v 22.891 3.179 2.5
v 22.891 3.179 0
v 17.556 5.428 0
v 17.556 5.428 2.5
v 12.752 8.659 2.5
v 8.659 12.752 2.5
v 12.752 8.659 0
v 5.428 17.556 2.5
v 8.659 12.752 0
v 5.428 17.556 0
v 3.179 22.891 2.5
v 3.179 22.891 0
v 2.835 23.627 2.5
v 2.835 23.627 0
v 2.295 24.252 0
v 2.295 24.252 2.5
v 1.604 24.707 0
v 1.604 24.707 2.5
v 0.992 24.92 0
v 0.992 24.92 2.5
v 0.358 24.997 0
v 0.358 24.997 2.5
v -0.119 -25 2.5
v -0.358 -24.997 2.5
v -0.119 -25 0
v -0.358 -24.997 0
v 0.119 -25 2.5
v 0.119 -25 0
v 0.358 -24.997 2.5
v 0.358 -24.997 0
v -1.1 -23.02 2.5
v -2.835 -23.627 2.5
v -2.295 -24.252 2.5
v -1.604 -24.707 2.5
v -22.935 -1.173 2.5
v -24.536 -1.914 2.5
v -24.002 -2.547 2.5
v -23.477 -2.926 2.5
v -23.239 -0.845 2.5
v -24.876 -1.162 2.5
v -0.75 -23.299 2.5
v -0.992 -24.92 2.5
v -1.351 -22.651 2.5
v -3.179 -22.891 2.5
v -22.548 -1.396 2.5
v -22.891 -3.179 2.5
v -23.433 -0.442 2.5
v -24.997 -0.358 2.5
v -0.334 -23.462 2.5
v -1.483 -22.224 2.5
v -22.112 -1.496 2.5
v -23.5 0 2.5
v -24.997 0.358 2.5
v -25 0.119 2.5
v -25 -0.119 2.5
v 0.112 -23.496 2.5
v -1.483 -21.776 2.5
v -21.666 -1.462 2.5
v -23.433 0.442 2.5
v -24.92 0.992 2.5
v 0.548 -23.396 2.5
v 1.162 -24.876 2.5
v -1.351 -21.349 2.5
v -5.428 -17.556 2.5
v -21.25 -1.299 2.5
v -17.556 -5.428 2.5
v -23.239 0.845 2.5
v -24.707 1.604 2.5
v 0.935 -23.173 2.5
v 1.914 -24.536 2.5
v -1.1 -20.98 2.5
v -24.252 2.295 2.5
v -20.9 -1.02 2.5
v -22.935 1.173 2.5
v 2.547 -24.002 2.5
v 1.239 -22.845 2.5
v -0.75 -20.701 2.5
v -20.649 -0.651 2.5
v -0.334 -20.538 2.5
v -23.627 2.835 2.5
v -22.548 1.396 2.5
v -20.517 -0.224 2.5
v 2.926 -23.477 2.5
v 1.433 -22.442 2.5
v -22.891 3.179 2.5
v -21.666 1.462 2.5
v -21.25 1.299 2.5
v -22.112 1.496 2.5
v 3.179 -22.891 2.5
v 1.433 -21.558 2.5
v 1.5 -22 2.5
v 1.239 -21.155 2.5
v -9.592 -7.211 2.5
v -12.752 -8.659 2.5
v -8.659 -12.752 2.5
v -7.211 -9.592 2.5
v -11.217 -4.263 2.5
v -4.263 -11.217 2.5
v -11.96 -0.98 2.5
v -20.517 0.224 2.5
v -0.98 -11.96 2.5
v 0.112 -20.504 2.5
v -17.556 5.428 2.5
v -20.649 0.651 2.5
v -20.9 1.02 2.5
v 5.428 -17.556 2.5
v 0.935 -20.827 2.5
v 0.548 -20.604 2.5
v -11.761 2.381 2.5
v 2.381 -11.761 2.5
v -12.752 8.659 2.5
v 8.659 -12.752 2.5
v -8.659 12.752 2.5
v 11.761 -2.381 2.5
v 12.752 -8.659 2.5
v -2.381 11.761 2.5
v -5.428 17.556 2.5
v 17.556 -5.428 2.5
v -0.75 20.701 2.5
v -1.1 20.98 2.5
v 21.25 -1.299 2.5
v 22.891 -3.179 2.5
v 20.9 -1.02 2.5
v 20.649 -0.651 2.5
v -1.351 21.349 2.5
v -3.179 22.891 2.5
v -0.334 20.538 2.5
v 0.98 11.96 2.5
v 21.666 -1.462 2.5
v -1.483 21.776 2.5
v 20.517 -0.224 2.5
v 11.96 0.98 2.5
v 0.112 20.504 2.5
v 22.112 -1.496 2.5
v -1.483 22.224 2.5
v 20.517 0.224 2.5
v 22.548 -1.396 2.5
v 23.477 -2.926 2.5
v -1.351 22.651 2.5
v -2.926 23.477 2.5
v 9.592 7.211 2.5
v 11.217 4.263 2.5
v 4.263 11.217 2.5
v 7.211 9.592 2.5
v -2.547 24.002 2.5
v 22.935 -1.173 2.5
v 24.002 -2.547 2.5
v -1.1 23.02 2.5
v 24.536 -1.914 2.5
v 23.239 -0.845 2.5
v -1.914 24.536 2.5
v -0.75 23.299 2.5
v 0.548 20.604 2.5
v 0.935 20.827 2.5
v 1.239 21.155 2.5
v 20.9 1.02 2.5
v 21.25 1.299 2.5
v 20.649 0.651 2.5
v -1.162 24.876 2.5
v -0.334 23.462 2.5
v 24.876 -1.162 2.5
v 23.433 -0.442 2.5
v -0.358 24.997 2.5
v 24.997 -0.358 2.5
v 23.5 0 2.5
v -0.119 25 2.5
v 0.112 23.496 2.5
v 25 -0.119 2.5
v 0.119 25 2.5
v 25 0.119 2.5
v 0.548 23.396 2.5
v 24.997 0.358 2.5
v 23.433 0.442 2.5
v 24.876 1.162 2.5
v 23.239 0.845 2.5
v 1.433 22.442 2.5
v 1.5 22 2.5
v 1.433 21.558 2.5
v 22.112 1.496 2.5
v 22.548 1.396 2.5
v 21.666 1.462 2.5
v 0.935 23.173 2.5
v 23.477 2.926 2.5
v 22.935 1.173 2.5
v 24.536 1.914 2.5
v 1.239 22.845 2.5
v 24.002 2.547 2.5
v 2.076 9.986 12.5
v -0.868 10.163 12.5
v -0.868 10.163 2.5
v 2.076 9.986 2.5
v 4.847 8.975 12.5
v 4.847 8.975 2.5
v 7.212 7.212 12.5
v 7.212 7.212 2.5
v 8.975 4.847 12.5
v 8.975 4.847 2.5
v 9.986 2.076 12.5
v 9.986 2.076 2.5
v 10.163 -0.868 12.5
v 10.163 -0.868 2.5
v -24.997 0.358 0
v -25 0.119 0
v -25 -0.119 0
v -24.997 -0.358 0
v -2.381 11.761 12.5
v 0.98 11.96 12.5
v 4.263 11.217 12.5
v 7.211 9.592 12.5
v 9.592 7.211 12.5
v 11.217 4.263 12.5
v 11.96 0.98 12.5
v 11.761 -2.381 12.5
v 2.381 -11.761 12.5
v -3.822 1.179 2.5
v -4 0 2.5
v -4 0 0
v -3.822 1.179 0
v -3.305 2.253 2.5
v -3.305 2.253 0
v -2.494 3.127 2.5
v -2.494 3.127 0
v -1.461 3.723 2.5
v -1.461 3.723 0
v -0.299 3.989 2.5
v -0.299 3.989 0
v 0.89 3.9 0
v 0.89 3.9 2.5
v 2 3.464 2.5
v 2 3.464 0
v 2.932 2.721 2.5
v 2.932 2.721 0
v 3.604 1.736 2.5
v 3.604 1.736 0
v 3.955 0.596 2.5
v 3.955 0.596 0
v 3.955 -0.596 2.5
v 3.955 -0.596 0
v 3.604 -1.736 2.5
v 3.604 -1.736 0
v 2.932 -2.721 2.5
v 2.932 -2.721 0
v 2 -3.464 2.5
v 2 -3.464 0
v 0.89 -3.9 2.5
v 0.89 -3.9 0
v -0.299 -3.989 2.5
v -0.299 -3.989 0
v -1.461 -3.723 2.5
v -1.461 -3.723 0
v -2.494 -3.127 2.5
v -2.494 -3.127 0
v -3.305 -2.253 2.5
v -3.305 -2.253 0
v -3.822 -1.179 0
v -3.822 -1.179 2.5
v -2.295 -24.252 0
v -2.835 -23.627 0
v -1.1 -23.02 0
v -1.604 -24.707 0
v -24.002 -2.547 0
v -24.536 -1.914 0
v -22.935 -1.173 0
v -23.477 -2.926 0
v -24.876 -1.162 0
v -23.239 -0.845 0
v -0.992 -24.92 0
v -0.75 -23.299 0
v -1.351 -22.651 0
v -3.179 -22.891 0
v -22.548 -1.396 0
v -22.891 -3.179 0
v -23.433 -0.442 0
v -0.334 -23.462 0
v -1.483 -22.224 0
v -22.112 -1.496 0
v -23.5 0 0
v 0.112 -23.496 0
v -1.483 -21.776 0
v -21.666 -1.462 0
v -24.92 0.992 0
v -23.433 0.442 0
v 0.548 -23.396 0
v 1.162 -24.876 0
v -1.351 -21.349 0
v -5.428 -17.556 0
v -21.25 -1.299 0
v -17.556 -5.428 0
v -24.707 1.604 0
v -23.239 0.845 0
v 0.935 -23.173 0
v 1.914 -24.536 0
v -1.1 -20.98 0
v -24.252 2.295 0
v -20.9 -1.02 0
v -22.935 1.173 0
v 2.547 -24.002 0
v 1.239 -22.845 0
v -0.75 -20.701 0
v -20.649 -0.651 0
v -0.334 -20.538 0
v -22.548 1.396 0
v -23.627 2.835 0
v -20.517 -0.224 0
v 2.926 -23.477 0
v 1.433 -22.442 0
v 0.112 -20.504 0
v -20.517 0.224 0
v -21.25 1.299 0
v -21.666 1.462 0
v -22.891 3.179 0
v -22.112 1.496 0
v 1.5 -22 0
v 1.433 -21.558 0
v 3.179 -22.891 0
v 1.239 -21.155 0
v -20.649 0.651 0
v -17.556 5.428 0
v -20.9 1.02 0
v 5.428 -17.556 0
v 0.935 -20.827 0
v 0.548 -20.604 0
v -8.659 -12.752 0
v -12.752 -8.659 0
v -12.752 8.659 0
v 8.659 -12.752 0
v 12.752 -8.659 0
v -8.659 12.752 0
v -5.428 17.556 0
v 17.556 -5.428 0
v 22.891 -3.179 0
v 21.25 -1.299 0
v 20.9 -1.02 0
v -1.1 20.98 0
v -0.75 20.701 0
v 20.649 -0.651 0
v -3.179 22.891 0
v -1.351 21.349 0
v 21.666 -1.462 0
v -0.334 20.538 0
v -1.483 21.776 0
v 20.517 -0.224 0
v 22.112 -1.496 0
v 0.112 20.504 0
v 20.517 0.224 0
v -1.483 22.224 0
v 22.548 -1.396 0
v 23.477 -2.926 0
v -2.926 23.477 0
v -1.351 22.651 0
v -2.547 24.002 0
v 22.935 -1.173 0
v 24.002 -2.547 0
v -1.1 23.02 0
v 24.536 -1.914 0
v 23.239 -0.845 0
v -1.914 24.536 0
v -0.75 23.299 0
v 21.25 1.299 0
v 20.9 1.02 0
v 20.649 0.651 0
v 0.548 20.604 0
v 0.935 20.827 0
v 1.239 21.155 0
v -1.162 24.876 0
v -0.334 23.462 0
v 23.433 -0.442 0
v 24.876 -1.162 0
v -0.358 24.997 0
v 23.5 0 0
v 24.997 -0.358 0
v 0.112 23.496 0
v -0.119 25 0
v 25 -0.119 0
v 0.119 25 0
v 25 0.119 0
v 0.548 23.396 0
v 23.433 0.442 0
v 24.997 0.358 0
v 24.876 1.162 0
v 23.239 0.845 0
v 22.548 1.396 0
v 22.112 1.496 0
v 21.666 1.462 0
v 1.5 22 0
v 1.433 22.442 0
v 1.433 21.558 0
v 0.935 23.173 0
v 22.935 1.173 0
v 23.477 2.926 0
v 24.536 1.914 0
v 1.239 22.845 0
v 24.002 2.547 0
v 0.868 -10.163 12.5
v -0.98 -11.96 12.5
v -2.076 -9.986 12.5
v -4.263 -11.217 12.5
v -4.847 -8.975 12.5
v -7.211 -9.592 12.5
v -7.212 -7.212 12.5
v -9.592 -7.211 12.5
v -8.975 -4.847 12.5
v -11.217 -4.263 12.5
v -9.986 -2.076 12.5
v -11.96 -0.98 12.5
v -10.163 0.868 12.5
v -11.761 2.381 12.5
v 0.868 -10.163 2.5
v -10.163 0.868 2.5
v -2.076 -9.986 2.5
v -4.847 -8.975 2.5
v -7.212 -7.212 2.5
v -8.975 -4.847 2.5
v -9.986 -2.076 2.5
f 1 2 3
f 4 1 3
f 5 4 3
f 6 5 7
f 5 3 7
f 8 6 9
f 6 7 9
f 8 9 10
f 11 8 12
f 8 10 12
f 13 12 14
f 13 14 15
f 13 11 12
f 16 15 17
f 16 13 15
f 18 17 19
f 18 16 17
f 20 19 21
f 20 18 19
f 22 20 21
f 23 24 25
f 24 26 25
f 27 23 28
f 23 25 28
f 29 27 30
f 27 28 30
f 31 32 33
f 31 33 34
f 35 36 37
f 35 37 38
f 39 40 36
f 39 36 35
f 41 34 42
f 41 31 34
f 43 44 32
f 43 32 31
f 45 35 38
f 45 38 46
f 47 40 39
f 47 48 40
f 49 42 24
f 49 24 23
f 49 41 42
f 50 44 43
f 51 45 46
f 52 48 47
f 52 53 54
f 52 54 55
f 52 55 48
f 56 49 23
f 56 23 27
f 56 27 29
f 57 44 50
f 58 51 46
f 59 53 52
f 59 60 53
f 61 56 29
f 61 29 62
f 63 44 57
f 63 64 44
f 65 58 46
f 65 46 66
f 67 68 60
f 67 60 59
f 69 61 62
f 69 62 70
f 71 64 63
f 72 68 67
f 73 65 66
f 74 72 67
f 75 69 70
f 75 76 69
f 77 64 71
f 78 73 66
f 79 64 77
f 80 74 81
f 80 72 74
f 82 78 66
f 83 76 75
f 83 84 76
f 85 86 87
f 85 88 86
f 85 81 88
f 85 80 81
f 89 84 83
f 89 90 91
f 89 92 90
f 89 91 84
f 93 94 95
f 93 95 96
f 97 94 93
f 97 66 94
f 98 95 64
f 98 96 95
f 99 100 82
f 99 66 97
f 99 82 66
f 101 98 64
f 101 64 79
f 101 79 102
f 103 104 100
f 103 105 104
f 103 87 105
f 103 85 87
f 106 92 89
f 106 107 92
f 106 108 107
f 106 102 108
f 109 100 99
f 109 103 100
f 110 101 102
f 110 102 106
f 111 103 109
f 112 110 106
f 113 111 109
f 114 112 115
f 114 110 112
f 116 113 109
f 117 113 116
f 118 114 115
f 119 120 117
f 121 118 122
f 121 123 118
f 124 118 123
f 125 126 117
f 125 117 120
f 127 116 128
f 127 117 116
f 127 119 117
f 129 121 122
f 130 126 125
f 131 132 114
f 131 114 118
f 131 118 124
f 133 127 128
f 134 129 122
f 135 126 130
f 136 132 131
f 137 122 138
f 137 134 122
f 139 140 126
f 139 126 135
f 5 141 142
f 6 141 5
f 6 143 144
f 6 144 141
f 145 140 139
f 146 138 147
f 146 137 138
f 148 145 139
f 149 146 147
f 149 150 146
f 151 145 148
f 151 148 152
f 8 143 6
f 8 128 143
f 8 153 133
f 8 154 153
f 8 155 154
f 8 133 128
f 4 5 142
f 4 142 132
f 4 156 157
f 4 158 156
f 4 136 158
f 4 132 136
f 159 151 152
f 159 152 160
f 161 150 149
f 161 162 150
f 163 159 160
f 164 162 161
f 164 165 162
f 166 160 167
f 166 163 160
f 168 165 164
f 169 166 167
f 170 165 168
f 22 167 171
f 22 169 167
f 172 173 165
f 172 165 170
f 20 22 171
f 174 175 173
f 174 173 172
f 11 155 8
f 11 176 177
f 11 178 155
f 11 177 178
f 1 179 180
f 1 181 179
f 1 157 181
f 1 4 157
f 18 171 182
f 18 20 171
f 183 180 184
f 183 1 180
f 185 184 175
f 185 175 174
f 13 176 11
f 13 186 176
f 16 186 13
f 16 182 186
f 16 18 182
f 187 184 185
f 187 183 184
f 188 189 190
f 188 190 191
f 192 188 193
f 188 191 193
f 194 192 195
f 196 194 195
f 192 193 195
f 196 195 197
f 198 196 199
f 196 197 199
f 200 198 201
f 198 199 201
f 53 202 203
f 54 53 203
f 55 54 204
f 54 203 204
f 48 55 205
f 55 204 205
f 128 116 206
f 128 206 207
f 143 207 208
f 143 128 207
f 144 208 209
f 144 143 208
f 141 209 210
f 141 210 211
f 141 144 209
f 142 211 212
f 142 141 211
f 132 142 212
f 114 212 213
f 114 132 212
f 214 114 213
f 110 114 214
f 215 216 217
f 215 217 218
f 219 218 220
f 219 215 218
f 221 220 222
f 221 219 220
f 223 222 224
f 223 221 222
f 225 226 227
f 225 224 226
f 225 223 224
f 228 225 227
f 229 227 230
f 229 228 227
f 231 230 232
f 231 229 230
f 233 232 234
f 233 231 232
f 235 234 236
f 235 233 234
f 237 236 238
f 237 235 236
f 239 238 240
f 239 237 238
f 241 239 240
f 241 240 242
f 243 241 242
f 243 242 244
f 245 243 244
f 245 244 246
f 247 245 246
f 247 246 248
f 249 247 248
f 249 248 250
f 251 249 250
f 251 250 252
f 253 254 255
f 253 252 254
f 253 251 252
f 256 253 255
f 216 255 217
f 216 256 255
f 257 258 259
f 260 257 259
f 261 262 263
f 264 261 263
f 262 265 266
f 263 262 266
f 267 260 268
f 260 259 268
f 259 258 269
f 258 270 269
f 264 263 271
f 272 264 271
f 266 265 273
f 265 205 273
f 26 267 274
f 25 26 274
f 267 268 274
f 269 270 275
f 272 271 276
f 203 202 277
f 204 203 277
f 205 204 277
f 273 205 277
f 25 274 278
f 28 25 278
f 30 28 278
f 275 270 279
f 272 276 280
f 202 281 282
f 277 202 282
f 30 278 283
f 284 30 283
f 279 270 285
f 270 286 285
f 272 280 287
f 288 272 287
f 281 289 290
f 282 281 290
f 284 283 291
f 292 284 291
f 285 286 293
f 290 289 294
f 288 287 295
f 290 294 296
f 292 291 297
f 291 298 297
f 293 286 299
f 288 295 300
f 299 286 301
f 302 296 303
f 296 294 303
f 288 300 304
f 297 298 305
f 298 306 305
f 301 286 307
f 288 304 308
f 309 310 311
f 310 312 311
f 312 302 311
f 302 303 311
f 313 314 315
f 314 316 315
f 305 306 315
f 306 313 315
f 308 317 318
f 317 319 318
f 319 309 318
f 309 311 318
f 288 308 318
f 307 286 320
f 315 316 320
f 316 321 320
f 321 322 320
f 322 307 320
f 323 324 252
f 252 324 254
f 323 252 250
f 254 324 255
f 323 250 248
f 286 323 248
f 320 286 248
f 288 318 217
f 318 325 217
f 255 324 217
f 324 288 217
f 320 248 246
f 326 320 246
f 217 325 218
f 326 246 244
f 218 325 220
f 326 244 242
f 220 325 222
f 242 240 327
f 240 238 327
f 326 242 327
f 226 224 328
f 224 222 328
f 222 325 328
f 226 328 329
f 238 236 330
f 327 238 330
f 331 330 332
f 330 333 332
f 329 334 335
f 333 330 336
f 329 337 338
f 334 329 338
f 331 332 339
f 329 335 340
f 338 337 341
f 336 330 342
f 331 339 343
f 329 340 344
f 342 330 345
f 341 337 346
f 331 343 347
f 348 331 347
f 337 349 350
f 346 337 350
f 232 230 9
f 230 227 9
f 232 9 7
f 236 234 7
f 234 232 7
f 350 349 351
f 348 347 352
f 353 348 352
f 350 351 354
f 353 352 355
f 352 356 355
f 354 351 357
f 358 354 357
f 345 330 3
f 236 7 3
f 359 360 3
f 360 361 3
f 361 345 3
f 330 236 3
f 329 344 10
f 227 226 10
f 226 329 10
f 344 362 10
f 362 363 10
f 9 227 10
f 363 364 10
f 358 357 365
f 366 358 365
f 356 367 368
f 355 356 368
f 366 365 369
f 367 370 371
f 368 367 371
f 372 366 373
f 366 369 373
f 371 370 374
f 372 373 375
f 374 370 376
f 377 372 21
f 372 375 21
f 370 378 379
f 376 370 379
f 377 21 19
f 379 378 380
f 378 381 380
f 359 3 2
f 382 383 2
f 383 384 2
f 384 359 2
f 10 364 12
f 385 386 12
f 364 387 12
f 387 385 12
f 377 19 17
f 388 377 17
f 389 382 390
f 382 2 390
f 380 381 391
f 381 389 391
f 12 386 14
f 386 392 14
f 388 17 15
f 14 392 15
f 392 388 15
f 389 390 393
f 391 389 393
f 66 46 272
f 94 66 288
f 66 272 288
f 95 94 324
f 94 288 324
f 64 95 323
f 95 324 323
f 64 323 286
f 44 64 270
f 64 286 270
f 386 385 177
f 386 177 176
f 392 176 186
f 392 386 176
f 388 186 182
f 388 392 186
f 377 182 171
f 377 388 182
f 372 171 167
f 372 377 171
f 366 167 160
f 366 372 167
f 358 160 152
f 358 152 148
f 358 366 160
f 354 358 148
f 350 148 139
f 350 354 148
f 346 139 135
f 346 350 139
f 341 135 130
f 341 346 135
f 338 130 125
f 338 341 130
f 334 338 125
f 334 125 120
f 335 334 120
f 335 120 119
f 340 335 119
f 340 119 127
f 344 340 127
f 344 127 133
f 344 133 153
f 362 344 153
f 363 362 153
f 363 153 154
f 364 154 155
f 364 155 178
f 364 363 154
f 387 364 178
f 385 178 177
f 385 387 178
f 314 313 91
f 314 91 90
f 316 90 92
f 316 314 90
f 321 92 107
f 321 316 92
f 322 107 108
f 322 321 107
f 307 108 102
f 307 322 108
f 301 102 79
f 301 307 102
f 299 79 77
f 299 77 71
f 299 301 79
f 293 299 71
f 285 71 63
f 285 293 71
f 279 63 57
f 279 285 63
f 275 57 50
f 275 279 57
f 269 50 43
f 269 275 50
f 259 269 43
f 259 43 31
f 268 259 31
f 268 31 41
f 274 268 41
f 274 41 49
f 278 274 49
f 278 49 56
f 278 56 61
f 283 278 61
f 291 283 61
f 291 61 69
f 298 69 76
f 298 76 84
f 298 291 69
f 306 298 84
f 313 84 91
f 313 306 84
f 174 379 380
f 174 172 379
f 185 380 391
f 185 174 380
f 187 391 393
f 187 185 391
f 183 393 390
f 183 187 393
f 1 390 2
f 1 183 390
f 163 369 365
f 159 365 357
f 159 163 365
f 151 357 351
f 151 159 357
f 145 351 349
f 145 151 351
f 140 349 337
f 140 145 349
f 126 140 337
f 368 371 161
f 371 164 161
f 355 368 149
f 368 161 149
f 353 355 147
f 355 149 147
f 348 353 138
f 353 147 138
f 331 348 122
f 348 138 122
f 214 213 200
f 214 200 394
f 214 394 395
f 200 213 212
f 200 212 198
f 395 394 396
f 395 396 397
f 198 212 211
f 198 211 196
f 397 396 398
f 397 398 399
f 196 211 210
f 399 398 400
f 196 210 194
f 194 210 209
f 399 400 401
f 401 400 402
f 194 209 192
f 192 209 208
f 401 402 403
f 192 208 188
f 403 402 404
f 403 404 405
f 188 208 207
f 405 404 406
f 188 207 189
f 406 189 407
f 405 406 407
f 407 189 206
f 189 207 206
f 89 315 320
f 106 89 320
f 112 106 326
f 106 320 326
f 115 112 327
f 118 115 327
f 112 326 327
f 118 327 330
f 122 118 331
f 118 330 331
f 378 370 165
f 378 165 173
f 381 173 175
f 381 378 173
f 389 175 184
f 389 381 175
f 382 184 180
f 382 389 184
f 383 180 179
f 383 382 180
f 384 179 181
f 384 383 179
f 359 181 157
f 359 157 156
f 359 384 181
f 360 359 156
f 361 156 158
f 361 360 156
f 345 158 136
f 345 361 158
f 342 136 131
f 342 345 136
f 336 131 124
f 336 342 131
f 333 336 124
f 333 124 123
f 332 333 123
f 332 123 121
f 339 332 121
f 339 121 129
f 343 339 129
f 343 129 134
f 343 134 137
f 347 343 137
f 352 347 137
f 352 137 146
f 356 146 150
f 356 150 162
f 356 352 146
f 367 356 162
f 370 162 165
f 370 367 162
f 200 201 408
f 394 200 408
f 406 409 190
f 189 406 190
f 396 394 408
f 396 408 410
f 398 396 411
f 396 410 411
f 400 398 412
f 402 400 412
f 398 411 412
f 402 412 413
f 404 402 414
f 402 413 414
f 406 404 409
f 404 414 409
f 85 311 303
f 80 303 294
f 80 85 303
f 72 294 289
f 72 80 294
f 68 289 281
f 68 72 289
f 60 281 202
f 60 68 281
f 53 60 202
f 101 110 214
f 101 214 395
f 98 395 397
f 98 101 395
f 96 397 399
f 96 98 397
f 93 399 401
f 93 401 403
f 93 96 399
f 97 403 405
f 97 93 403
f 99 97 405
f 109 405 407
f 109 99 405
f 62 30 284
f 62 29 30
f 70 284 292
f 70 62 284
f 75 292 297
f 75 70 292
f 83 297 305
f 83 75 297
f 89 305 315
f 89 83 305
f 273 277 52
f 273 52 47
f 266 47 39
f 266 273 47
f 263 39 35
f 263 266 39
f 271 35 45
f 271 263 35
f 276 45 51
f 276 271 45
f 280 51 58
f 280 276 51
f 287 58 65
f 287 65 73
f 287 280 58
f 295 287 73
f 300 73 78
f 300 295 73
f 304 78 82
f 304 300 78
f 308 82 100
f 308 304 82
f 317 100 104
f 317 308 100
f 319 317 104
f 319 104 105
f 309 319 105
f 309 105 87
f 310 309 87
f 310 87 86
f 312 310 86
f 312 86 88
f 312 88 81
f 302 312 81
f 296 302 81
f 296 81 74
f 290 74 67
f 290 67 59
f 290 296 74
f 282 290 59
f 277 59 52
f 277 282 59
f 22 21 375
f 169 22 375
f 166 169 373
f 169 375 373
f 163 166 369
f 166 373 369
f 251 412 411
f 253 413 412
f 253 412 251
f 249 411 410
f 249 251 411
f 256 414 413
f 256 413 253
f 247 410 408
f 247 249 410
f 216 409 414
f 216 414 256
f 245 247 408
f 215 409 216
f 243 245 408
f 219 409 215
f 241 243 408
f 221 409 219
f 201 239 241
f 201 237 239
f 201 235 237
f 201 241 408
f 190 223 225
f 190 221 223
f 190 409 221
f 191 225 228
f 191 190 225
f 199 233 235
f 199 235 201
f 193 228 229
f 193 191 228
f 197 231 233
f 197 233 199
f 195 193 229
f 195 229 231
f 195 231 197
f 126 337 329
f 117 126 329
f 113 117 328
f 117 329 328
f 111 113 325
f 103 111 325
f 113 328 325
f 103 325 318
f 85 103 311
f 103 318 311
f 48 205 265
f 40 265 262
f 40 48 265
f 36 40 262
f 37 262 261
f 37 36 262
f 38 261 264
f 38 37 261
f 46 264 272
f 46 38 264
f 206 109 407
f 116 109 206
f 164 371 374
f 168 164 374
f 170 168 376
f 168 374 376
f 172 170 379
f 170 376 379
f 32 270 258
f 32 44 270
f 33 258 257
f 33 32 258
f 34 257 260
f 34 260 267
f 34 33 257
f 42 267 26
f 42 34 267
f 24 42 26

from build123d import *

# Parameters (mm, degrees)
SKETCH_1_R               = 25
SKETCH_1_R_2             = 1.5
EXTRUDE_1_DEPTH          = 2.5
CUT_EXTRUDE_2_DEPTH      = 36.443617197
CUT_EXTRUDE_2_DEPTH_BACK = 36.443617197
SKETCH_3_R               = 4
CUT_EXTRUDE_5_DEPTH      = 10
FILLET_2_R               = 3
EXTRUDE_2_DEPTH          = 10


with BuildPart() as part:
    # 草图1 → 凸台-拉伸1 (new body)
    with BuildSketch(Plane.XY):
        Circle(SKETCH_1_R)
        with Locations((0, 22)):
            Circle(SKETCH_1_R_2, mode=Mode.SUBTRACT)
        with Locations((22, 0)):
            Circle(SKETCH_1_R_2, mode=Mode.SUBTRACT)
        with Locations((0, -22)):
            Circle(SKETCH_1_R_2, mode=Mode.SUBTRACT)
        with Locations(Location((-22, 0, 0), (0, 0, 180))):
            Circle(SKETCH_1_R_2, mode=Mode.SUBTRACT)
    extrude(amount=EXTRUDE_1_DEPTH)

    # 草图3 → 切除-拉伸2 (cut, two sides: drawn at the far end of the back side and taken through both)
    with BuildSketch(Plane(origin=(0, 0, 0), x_dir=(-1, 0, 0), z_dir=(0, 0, -1)).offset(-CUT_EXTRUDE_2_DEPTH_BACK)):
        Circle(SKETCH_3_R)
    extrude(amount=CUT_EXTRUDE_2_DEPTH + CUT_EXTRUDE_2_DEPTH_BACK, mode=Mode.SUBTRACT)

    # 草图5 → 切除-拉伸5 (cut)
    with BuildSketch(Plane(origin=(0, 0, 0), x_dir=(-1, 0, 0), z_dir=(0, 0, -1))):
        with BuildLine():
            ThreePointArc((-2.638187412, 24.860409634), (-17.67766953, 17.67766953), (-24.860409634, 2.638187412))
            ThreePointArc((-24.860409634, 2.638187412), (-10.606601718, 10.606601718), (-2.638187412, 24.860409634))
        make_face()
        with BuildLine():
            ThreePointArc((-2.638187412, -24.860409634), (-10.606601718, -10.606601718), (-24.860409634, -2.638187412))
            ThreePointArc((-24.860409634, -2.638187412), (-17.67766953, -17.67766953), (-2.638187412, -24.860409634))
        make_face()
        with BuildLine():
            ThreePointArc((24.860409634, -2.638187412), (10.606601718, -10.606601718), (2.638187412, -24.860409634))
            ThreePointArc((2.638187412, -24.860409634), (17.67766953, -17.67766953), (24.860409634, -2.638187412))
        make_face()
        with BuildLine():
            ThreePointArc((24.860409634, 2.638187412), (17.67766953, 17.67766953), (2.638187412, 24.860409634))
            ThreePointArc((2.638187412, 24.860409634), (10.606601718, 10.606601718), (24.860409634, 2.638187412))
        make_face()
    extrude(amount=-CUT_EXTRUDE_5_DEPTH, mode=Mode.SUBTRACT)

    # 圆角2
    fillet_2_edges = [part.edges().sort_by_distance(p)[0] for p in [
        (2.638187412, 24.860409634, 1.25),
        (24.860409634, 2.638187412, 1.25),
        (24.860409634, -2.638187412, 1.25),
        (2.638187412, -24.860409634, 1.25),
        (-2.638187412, -24.860409634, 1.25),
        (-24.860409634, -2.638187412, 1.25),
        (-24.860409634, 2.638187412, 1.25),
        (-2.638187412, 24.860409634, 1.25),
    ]]
    fillet(fillet_2_edges, radius=FILLET_2_R)

    # 草图6 → 凸台-拉伸2 (add)
    with BuildSketch(Plane.XY.offset(2.5)):
        with BuildLine():
            Line((-11.761483572, 2.380652052), (-2.380652052, 11.761483572))
            ThreePointArc((-2.380652052, 11.761483572), (8.485281374, 8.485281374), (11.761483572, -2.380652052))
            Line((11.761483572, -2.380652052), (2.380652052, -11.761483572))
            ThreePointArc((2.380652052, -11.761483572), (-8.485281374, -8.485281374), (-11.761483572, 2.380652052))
        make_face()
        with BuildLine():
            Line((-10.163012909, 0.867852878), (-0.867852878, 10.163012909))
            ThreePointArc((-0.867852878, 10.163012909), (7.212489168, 7.212489168), (10.163012909, -0.867852878))
            Line((10.163012909, -0.867852878), (0.867852878, -10.163012909))
            ThreePointArc((0.867852878, -10.163012909), (-7.212489168, -7.212489168), (-10.163012909, 0.867852878))
        make_face(mode=Mode.SUBTRACT)
    extrude(amount=EXTRUDE_2_DEPTH)


solid = part.part
